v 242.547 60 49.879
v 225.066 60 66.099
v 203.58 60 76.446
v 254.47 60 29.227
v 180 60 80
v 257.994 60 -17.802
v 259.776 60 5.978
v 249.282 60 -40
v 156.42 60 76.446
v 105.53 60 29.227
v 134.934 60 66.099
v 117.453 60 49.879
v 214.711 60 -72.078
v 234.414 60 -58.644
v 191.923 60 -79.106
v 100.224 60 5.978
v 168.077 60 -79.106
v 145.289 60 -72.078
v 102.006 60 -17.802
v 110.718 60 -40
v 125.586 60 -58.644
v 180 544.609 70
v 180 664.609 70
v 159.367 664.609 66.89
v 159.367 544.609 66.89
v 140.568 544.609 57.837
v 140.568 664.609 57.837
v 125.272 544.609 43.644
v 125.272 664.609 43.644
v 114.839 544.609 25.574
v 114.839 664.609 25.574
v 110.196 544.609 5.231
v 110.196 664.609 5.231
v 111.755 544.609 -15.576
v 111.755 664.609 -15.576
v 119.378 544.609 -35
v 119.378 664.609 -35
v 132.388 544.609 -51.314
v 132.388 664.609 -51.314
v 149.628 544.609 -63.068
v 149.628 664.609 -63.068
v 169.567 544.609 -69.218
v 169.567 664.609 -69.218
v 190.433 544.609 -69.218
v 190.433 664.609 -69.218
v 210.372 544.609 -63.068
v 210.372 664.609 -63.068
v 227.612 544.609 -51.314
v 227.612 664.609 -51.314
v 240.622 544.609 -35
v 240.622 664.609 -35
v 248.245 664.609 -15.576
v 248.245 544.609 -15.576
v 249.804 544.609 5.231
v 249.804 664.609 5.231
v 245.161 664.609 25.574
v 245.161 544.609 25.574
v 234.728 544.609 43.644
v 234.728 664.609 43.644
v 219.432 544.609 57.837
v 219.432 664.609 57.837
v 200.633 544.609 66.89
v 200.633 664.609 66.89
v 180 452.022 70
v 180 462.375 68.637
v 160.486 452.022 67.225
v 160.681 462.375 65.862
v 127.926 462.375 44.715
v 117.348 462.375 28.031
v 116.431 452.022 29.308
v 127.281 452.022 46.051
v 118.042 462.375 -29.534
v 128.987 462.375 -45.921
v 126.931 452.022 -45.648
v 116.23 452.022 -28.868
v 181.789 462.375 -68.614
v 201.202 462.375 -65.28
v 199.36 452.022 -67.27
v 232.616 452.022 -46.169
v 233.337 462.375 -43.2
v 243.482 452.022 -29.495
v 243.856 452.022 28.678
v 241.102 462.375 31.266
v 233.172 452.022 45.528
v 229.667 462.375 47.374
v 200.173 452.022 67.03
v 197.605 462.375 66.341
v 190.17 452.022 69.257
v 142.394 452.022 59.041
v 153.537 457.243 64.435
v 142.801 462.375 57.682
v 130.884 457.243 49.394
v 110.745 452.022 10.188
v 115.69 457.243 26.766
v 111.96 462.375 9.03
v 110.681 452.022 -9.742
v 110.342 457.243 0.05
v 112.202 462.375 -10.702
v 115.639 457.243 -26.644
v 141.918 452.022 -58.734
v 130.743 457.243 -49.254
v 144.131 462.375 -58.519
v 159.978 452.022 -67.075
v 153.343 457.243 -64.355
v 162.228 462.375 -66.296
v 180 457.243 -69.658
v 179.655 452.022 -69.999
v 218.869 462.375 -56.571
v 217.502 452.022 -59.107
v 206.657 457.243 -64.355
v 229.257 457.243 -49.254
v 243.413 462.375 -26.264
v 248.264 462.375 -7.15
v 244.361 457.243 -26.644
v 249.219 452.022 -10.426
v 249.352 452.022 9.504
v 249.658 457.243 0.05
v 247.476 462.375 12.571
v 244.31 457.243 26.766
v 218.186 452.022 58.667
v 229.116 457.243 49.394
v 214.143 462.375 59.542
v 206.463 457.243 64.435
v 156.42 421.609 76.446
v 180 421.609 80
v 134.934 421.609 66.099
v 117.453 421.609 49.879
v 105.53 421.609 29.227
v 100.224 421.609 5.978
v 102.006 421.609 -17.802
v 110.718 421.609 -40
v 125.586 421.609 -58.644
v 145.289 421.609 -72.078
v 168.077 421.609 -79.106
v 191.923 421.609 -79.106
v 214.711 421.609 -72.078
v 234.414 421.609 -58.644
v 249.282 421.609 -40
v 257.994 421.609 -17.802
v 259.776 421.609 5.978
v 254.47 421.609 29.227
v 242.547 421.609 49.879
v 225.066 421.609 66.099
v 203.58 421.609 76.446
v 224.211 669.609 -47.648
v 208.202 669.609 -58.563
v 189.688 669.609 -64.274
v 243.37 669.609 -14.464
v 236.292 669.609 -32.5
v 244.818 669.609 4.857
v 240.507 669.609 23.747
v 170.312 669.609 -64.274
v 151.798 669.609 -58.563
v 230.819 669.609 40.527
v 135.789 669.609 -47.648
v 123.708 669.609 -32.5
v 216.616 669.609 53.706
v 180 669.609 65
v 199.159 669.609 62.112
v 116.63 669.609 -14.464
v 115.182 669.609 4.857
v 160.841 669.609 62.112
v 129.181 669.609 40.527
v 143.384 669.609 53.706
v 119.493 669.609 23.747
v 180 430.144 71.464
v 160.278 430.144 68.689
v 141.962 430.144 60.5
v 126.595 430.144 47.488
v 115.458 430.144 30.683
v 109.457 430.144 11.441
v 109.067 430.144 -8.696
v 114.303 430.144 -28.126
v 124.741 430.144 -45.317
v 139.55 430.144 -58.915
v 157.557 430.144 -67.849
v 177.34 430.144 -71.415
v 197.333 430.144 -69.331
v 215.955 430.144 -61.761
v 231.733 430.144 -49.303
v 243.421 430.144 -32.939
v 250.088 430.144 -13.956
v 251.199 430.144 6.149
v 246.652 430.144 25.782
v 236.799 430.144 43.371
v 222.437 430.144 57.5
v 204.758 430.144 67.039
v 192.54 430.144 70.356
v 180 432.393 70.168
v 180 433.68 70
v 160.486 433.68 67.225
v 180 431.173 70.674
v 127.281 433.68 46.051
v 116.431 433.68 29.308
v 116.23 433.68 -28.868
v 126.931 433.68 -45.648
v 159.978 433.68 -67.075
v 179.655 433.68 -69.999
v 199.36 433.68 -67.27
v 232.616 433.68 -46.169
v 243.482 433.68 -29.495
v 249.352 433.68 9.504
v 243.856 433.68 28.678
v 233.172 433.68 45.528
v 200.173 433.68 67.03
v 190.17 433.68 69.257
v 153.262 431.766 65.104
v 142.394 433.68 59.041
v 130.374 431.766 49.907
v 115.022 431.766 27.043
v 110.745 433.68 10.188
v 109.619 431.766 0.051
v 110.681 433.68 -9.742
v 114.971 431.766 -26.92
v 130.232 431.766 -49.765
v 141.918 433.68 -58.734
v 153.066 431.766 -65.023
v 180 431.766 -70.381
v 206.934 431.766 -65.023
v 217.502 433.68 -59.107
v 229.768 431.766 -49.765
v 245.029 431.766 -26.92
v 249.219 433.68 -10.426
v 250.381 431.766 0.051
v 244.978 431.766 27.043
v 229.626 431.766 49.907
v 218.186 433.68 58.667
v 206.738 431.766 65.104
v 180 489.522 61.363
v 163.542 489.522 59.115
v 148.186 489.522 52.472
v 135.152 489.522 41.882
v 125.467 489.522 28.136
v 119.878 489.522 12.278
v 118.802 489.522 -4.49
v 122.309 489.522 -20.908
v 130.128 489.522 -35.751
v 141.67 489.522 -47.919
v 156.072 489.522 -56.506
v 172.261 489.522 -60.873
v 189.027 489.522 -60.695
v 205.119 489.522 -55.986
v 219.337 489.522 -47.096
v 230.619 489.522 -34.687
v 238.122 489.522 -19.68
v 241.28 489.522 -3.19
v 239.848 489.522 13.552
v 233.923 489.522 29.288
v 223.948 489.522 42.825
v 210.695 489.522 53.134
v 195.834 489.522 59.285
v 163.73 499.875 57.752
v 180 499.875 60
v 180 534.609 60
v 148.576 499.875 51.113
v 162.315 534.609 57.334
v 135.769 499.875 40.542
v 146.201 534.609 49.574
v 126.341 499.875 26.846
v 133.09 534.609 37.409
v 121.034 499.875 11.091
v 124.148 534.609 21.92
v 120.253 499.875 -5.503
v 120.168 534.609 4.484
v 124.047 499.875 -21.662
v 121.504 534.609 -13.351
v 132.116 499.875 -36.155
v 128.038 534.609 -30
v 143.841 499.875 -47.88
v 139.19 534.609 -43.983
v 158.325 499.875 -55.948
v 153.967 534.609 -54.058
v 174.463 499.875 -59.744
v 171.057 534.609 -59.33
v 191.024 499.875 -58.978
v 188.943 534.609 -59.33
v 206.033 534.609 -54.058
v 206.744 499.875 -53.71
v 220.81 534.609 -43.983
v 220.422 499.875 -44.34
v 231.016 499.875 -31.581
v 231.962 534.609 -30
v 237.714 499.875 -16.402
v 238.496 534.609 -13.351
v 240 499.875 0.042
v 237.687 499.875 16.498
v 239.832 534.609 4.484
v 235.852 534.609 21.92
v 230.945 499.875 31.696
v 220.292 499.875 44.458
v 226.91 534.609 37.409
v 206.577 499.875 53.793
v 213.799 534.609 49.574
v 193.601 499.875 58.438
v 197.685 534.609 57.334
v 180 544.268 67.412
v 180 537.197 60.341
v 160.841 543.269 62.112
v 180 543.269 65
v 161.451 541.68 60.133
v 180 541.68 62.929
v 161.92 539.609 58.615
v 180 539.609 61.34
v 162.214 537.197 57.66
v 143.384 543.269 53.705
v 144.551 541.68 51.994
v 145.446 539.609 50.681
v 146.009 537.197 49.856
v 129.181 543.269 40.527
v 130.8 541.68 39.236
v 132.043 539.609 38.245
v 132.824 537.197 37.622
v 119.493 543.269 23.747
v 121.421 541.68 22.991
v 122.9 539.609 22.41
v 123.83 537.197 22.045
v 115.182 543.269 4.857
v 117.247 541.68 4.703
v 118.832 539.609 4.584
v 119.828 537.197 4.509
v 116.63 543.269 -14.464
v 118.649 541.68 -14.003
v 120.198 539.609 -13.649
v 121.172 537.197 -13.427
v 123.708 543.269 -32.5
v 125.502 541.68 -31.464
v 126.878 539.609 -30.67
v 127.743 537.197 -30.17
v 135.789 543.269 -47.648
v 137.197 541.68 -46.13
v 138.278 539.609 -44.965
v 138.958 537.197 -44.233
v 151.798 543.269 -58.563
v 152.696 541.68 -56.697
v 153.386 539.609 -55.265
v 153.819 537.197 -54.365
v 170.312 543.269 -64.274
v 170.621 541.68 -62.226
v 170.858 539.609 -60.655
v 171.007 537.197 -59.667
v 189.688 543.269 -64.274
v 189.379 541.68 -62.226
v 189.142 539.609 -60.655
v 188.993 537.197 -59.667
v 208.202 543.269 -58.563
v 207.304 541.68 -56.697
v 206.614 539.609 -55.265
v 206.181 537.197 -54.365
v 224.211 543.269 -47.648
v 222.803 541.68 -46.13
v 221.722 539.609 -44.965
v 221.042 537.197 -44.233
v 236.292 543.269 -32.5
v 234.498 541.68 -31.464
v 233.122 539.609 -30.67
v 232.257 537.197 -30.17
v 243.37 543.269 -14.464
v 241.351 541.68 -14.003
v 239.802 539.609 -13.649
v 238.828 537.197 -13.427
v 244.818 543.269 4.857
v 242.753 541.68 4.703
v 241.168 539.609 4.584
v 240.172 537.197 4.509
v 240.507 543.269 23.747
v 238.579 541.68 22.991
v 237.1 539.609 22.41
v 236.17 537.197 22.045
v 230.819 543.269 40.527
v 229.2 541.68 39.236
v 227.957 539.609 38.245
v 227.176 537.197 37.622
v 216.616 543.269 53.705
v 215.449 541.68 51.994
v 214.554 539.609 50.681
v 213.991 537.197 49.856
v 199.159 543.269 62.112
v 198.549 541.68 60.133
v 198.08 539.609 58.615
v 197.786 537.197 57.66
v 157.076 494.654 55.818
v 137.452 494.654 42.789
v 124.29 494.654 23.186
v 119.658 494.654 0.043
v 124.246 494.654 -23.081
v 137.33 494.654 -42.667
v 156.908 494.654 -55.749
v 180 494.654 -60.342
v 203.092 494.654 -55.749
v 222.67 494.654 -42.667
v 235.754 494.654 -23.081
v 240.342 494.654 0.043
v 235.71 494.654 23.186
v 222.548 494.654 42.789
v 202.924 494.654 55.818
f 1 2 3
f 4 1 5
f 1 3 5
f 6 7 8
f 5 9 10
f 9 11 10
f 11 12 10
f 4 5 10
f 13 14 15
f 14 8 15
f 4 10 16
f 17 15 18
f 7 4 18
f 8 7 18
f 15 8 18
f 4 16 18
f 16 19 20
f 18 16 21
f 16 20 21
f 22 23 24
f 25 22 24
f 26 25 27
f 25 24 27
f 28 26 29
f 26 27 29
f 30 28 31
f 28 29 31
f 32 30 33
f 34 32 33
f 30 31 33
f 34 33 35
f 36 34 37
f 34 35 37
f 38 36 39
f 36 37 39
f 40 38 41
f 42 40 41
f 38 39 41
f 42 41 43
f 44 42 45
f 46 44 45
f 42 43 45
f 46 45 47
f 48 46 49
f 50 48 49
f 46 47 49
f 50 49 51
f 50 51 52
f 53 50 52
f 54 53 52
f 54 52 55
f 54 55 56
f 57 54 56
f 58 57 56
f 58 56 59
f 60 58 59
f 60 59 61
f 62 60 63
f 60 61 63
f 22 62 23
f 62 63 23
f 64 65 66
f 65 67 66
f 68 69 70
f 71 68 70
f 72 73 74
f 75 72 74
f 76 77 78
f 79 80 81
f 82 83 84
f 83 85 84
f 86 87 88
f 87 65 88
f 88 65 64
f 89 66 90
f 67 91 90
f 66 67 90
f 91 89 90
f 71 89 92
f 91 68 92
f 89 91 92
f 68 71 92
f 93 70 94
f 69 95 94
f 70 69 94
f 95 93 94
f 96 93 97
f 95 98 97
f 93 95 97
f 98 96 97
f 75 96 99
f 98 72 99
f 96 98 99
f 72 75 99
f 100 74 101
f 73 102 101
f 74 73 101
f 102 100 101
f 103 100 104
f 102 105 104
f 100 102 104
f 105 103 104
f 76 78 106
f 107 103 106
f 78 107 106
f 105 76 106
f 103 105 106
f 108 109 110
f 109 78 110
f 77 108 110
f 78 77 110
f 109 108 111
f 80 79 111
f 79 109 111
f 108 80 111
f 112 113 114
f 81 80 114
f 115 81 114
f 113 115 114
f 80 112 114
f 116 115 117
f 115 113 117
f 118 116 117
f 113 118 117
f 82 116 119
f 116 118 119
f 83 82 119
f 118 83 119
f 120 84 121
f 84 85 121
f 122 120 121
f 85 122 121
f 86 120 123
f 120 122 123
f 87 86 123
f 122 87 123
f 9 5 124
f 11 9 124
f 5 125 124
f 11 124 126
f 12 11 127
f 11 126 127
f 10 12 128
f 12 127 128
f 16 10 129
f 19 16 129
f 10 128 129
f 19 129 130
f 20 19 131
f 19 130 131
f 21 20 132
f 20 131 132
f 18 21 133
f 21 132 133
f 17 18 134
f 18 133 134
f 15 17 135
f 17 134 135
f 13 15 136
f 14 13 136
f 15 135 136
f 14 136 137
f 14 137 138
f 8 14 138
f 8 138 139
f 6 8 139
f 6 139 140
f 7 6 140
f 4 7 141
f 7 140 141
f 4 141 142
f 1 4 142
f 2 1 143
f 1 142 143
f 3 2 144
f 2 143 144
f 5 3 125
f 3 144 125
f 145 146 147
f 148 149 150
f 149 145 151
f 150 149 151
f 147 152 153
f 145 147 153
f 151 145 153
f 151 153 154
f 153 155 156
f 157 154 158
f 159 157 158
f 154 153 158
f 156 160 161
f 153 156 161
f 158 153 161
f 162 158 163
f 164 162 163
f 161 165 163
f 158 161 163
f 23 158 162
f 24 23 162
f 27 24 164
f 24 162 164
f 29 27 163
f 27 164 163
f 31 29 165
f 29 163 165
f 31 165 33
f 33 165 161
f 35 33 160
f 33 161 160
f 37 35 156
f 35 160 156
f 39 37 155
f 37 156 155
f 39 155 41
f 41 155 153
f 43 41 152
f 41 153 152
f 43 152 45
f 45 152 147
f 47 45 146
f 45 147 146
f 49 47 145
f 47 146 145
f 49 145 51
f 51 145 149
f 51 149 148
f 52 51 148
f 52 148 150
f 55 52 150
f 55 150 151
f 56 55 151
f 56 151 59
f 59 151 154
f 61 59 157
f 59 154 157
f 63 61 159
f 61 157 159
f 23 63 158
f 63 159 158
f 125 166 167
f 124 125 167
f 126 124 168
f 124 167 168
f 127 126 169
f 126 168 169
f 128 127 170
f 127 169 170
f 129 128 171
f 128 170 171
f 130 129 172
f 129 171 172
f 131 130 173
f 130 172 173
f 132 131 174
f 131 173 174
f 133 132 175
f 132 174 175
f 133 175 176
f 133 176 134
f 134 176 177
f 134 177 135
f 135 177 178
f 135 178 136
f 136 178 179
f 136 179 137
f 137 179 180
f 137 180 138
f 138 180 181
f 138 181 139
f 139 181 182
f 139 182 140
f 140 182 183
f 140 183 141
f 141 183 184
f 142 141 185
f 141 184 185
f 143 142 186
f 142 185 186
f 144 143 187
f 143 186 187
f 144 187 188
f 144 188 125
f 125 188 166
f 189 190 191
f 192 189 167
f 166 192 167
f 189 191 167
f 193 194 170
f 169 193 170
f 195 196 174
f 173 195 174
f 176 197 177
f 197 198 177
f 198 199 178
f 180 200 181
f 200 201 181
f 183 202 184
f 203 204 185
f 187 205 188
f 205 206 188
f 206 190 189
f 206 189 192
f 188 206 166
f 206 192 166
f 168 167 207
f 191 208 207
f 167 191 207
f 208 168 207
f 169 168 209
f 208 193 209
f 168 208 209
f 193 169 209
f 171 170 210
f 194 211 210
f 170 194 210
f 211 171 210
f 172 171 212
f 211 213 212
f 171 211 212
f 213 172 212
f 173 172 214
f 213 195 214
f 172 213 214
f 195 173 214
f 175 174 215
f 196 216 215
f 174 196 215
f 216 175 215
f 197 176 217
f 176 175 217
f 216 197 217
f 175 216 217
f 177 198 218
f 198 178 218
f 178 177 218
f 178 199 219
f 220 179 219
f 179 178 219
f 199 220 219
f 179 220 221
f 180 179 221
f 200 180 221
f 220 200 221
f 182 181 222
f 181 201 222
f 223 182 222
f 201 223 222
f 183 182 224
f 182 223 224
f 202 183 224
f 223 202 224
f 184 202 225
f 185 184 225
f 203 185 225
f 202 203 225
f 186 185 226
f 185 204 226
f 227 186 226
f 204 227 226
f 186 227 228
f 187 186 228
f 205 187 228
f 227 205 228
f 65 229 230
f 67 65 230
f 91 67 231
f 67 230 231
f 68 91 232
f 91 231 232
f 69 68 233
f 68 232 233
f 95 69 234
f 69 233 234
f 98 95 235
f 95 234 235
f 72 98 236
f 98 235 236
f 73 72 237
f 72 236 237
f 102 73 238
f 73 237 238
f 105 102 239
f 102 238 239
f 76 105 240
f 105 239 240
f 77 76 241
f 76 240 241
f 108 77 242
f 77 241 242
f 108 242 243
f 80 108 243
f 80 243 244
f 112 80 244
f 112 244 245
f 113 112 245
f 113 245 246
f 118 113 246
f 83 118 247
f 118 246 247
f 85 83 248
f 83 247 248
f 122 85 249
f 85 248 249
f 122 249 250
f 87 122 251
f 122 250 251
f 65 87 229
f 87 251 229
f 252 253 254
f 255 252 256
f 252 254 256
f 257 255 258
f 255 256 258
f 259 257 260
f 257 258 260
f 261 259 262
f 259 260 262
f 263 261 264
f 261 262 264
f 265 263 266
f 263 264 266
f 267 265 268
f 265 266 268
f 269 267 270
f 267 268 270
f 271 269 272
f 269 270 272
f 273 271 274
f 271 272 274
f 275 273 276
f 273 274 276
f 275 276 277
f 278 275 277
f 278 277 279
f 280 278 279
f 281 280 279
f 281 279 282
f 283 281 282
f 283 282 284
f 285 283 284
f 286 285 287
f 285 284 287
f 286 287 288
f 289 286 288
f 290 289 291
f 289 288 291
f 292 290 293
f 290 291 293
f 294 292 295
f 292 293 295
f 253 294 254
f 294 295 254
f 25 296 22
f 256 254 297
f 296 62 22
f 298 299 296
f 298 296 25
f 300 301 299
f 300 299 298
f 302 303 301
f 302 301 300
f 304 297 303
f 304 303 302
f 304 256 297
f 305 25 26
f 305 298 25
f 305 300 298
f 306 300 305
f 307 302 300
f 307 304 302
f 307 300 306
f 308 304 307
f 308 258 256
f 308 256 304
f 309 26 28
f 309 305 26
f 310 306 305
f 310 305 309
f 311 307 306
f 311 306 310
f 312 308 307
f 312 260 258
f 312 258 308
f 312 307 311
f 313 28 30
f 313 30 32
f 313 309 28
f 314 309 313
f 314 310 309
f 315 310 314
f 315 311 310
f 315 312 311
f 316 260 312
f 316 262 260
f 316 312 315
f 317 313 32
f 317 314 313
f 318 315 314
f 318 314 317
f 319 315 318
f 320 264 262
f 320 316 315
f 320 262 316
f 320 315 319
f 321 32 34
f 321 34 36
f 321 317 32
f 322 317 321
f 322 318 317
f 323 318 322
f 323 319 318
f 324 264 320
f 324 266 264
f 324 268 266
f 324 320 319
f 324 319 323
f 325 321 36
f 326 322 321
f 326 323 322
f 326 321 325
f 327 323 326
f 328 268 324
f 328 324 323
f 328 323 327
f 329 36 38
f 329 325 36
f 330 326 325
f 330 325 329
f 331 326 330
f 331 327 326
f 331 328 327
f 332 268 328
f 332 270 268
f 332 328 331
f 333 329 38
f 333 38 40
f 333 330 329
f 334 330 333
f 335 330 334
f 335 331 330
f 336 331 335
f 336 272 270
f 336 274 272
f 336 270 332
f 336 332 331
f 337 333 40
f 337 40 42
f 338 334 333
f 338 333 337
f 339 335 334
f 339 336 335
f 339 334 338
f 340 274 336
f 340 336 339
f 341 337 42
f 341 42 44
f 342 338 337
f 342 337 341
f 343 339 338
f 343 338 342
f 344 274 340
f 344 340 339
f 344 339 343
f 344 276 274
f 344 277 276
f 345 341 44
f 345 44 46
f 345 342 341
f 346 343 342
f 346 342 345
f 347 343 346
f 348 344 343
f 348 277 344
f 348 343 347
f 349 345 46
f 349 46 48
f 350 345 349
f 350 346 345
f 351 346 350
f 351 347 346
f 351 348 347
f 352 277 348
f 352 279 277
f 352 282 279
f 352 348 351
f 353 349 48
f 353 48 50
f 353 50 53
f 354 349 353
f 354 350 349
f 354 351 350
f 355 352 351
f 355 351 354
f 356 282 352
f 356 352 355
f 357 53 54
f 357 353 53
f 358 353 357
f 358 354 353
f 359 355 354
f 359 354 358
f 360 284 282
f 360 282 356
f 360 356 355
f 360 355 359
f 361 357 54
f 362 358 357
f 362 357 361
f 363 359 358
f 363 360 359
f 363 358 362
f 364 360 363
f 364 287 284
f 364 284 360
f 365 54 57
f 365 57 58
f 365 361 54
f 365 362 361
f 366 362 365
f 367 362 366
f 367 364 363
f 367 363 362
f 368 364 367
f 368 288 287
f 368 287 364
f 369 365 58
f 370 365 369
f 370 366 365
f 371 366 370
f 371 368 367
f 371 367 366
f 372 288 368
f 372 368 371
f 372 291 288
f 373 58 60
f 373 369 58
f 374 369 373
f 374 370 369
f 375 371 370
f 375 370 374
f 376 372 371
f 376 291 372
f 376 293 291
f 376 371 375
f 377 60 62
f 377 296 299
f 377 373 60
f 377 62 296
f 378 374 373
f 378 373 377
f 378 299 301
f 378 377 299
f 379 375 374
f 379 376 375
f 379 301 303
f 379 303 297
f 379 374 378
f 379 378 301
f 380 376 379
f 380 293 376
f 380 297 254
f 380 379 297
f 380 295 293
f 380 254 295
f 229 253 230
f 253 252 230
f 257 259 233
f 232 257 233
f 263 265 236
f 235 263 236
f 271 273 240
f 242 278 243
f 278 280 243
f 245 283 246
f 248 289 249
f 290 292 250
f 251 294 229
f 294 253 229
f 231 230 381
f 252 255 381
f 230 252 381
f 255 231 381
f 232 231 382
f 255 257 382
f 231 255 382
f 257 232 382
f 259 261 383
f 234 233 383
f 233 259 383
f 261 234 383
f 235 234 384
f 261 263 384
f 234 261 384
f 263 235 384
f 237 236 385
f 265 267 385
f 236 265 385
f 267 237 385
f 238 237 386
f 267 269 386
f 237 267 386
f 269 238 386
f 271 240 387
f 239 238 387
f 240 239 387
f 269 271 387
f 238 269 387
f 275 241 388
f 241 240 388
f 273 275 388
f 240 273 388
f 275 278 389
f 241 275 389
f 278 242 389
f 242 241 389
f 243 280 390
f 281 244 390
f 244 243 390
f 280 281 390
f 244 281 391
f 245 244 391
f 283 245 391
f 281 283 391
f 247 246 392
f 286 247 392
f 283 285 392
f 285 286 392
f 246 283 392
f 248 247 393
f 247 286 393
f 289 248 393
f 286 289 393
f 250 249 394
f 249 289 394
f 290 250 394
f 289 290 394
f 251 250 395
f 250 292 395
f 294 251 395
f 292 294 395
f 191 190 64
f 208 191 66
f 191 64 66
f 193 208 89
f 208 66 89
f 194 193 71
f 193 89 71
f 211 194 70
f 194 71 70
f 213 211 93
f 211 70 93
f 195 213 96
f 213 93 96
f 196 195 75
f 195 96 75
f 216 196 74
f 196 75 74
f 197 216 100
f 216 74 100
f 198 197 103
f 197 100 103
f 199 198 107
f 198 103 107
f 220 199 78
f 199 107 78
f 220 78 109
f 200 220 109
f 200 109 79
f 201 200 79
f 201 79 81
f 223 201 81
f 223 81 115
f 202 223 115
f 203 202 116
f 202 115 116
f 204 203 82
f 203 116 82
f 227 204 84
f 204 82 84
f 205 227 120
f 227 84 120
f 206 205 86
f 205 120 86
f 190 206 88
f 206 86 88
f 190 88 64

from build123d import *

# Parameters (mm, degrees)
CHAMFER1_SIZE = 5
FILLET1_R     = 10
FILLET2_R     = 40
FILLET3_R     = 5


with BuildPart() as part:
    # Sketch25 → Revolve1 (revolve)
    with BuildSketch(Plane.XY, mode=Mode.PRIVATE) as revolve1_sk:
        Polygon((180, 60), (260, 60), (260, 421.608554244), (250, 431.608554244), (250, 457.288046169), (240, 494.608554244), (240, 544.608554244), (250, 544.608554244), (250, 669.608554244), (180, 669.608554244), align=None)
    revolve(revolve1_sk.sketch.rotate(Axis((180, 669.608554244, 0), (0, -1, 0)), 90), axis=Axis((180, 669.608554244, 0), (0, -1, 0)))

    # Chamfer1
    chamfer1_edges = [part.edges().sort_by_distance(p)[0] for p in [
        (180, 669.608554244, -70),
    ]]
    chamfer(chamfer1_edges, length=CHAMFER1_SIZE)

    # Fillet1
    fillet1_edges = [part.edges().sort_by_distance(p)[0] for p in [
        (180, 544.608554244, -60),
    ]]
    fillet(fillet1_edges, radius=FILLET1_R - 0.0001)  # a hair under: the kernel refuses the full size

    # Fillet2
    fillet2_edges = [part.edges().sort_by_distance(p)[0] for p in [
        (180, 494.608554244, -60),
        (180, 457.288046169, -70),
    ]]
    fillet(fillet2_edges, radius=FILLET2_R)

    # Fillet3
    fillet3_edges = [part.edges().sort_by_distance(p)[0] for p in [
        (180, 431.608554244, -70),
    ]]
    fillet(fillet3_edges, radius=FILLET3_R)


solid = part.part
